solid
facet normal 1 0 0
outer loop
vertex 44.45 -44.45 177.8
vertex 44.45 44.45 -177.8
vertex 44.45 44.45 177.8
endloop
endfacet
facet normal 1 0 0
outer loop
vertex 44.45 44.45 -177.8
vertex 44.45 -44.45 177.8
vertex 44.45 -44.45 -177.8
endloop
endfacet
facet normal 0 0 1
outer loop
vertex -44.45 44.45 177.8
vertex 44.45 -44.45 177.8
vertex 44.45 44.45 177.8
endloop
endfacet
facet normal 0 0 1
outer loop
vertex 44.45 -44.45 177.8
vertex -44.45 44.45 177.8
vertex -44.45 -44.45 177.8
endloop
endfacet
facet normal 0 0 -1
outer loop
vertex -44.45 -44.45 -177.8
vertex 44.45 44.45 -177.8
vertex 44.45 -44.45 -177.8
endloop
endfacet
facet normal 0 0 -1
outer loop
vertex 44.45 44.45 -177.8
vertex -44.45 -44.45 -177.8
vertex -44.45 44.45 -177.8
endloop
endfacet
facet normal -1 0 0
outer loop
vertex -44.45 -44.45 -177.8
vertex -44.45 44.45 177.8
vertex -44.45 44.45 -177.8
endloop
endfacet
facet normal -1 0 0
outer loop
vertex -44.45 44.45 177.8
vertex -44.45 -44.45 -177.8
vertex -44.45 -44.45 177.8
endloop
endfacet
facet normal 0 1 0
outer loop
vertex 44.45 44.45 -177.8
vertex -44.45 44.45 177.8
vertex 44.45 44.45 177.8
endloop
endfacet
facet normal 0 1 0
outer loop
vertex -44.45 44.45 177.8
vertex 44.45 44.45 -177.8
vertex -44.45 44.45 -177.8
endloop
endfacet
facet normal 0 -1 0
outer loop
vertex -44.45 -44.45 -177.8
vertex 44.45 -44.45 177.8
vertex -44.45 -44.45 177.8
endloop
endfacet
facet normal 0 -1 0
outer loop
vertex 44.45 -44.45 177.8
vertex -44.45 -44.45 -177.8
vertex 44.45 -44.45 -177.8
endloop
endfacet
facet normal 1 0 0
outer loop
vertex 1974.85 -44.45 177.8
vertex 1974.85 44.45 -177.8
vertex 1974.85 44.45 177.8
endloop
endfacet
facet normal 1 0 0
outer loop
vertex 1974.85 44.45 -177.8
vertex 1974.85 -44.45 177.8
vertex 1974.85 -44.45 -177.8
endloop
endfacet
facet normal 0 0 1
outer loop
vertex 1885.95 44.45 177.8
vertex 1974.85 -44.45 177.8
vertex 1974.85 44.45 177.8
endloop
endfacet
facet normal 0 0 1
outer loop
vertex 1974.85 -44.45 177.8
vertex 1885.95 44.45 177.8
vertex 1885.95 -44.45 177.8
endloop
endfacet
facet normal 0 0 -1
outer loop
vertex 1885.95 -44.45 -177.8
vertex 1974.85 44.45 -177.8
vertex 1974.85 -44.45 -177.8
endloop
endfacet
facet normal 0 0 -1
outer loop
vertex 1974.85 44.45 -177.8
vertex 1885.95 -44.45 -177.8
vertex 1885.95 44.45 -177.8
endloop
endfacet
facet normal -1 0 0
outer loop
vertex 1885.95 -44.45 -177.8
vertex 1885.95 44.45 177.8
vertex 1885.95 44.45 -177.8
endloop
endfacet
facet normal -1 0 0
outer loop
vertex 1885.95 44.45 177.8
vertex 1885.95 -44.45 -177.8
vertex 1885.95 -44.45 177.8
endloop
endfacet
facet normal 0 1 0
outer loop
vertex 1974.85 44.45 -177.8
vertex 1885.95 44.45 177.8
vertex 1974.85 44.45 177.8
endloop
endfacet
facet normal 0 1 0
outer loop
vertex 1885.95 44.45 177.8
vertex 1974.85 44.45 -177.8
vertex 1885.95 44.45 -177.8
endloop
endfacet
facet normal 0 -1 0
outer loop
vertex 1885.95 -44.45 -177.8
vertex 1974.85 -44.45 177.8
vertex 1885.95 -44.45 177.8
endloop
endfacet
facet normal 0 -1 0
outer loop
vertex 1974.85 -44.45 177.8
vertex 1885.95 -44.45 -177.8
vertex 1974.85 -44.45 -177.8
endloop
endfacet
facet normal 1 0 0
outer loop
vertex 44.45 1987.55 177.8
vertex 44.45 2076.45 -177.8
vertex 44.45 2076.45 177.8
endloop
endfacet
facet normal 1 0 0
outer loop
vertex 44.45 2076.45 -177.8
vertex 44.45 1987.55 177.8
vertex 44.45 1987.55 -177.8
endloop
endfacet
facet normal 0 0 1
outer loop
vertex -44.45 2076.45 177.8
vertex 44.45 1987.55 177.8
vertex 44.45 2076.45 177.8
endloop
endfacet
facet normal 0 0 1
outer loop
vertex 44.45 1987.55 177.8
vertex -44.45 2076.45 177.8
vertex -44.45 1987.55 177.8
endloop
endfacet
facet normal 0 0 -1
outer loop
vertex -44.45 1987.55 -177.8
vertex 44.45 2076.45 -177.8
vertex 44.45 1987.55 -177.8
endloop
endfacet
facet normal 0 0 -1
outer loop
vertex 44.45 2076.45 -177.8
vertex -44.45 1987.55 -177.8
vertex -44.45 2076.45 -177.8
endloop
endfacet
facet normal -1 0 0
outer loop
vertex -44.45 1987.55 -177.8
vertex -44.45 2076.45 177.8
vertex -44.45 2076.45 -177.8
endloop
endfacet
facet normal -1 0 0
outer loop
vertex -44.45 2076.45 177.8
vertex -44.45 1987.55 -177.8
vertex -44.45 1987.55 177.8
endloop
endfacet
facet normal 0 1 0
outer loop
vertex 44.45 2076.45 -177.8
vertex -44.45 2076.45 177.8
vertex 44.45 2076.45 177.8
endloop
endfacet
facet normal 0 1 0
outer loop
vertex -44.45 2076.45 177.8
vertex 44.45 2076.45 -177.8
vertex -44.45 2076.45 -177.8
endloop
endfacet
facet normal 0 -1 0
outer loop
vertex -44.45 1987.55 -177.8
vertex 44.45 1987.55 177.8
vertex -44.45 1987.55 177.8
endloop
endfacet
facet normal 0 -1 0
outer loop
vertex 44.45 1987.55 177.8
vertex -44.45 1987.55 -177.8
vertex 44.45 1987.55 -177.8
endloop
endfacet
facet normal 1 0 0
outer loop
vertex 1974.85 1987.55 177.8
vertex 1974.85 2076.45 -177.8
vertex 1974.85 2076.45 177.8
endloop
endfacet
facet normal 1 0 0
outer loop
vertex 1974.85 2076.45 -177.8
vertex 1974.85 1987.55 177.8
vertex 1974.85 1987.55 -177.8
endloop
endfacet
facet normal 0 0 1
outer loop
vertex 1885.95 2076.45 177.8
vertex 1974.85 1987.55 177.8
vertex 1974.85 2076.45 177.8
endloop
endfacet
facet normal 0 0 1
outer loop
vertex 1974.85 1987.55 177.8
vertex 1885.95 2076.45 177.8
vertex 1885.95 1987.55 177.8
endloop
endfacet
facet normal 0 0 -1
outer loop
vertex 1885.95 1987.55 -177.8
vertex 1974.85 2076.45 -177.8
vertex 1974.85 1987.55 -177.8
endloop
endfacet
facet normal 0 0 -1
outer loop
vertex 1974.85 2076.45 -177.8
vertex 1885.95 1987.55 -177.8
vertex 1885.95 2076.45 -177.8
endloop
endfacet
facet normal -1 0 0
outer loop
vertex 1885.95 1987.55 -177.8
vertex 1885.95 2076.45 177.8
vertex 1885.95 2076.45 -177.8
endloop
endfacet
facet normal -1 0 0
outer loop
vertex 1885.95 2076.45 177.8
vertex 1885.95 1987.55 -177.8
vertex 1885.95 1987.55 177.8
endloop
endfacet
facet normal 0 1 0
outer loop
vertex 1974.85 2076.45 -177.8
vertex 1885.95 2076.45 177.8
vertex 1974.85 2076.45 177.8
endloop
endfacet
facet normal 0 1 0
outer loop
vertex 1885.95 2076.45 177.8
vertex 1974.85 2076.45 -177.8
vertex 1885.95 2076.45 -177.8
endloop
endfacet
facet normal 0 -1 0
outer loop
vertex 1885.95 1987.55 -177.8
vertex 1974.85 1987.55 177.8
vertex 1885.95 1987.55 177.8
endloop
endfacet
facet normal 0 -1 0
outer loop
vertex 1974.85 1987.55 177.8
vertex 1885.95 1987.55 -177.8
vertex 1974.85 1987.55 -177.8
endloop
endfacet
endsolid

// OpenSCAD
inches_to_mm=25.4;

dl_4 = 3.5*inches_to_mm;
dl_2 = 1.5*inches_to_mm;


module post(height) {
    cube([dl_4,dl_4,height],center=true);
}


post(14*inches_to_mm);
translate([76*inches_to_mm,0,0])
    post(14*inches_to_mm);

translate([0,80*inches_to_mm,0])
    post(14*inches_to_mm);
translate([76*inches_to_mm,80*inches_to_mm,0])
    post(14*inches_to_mm);
